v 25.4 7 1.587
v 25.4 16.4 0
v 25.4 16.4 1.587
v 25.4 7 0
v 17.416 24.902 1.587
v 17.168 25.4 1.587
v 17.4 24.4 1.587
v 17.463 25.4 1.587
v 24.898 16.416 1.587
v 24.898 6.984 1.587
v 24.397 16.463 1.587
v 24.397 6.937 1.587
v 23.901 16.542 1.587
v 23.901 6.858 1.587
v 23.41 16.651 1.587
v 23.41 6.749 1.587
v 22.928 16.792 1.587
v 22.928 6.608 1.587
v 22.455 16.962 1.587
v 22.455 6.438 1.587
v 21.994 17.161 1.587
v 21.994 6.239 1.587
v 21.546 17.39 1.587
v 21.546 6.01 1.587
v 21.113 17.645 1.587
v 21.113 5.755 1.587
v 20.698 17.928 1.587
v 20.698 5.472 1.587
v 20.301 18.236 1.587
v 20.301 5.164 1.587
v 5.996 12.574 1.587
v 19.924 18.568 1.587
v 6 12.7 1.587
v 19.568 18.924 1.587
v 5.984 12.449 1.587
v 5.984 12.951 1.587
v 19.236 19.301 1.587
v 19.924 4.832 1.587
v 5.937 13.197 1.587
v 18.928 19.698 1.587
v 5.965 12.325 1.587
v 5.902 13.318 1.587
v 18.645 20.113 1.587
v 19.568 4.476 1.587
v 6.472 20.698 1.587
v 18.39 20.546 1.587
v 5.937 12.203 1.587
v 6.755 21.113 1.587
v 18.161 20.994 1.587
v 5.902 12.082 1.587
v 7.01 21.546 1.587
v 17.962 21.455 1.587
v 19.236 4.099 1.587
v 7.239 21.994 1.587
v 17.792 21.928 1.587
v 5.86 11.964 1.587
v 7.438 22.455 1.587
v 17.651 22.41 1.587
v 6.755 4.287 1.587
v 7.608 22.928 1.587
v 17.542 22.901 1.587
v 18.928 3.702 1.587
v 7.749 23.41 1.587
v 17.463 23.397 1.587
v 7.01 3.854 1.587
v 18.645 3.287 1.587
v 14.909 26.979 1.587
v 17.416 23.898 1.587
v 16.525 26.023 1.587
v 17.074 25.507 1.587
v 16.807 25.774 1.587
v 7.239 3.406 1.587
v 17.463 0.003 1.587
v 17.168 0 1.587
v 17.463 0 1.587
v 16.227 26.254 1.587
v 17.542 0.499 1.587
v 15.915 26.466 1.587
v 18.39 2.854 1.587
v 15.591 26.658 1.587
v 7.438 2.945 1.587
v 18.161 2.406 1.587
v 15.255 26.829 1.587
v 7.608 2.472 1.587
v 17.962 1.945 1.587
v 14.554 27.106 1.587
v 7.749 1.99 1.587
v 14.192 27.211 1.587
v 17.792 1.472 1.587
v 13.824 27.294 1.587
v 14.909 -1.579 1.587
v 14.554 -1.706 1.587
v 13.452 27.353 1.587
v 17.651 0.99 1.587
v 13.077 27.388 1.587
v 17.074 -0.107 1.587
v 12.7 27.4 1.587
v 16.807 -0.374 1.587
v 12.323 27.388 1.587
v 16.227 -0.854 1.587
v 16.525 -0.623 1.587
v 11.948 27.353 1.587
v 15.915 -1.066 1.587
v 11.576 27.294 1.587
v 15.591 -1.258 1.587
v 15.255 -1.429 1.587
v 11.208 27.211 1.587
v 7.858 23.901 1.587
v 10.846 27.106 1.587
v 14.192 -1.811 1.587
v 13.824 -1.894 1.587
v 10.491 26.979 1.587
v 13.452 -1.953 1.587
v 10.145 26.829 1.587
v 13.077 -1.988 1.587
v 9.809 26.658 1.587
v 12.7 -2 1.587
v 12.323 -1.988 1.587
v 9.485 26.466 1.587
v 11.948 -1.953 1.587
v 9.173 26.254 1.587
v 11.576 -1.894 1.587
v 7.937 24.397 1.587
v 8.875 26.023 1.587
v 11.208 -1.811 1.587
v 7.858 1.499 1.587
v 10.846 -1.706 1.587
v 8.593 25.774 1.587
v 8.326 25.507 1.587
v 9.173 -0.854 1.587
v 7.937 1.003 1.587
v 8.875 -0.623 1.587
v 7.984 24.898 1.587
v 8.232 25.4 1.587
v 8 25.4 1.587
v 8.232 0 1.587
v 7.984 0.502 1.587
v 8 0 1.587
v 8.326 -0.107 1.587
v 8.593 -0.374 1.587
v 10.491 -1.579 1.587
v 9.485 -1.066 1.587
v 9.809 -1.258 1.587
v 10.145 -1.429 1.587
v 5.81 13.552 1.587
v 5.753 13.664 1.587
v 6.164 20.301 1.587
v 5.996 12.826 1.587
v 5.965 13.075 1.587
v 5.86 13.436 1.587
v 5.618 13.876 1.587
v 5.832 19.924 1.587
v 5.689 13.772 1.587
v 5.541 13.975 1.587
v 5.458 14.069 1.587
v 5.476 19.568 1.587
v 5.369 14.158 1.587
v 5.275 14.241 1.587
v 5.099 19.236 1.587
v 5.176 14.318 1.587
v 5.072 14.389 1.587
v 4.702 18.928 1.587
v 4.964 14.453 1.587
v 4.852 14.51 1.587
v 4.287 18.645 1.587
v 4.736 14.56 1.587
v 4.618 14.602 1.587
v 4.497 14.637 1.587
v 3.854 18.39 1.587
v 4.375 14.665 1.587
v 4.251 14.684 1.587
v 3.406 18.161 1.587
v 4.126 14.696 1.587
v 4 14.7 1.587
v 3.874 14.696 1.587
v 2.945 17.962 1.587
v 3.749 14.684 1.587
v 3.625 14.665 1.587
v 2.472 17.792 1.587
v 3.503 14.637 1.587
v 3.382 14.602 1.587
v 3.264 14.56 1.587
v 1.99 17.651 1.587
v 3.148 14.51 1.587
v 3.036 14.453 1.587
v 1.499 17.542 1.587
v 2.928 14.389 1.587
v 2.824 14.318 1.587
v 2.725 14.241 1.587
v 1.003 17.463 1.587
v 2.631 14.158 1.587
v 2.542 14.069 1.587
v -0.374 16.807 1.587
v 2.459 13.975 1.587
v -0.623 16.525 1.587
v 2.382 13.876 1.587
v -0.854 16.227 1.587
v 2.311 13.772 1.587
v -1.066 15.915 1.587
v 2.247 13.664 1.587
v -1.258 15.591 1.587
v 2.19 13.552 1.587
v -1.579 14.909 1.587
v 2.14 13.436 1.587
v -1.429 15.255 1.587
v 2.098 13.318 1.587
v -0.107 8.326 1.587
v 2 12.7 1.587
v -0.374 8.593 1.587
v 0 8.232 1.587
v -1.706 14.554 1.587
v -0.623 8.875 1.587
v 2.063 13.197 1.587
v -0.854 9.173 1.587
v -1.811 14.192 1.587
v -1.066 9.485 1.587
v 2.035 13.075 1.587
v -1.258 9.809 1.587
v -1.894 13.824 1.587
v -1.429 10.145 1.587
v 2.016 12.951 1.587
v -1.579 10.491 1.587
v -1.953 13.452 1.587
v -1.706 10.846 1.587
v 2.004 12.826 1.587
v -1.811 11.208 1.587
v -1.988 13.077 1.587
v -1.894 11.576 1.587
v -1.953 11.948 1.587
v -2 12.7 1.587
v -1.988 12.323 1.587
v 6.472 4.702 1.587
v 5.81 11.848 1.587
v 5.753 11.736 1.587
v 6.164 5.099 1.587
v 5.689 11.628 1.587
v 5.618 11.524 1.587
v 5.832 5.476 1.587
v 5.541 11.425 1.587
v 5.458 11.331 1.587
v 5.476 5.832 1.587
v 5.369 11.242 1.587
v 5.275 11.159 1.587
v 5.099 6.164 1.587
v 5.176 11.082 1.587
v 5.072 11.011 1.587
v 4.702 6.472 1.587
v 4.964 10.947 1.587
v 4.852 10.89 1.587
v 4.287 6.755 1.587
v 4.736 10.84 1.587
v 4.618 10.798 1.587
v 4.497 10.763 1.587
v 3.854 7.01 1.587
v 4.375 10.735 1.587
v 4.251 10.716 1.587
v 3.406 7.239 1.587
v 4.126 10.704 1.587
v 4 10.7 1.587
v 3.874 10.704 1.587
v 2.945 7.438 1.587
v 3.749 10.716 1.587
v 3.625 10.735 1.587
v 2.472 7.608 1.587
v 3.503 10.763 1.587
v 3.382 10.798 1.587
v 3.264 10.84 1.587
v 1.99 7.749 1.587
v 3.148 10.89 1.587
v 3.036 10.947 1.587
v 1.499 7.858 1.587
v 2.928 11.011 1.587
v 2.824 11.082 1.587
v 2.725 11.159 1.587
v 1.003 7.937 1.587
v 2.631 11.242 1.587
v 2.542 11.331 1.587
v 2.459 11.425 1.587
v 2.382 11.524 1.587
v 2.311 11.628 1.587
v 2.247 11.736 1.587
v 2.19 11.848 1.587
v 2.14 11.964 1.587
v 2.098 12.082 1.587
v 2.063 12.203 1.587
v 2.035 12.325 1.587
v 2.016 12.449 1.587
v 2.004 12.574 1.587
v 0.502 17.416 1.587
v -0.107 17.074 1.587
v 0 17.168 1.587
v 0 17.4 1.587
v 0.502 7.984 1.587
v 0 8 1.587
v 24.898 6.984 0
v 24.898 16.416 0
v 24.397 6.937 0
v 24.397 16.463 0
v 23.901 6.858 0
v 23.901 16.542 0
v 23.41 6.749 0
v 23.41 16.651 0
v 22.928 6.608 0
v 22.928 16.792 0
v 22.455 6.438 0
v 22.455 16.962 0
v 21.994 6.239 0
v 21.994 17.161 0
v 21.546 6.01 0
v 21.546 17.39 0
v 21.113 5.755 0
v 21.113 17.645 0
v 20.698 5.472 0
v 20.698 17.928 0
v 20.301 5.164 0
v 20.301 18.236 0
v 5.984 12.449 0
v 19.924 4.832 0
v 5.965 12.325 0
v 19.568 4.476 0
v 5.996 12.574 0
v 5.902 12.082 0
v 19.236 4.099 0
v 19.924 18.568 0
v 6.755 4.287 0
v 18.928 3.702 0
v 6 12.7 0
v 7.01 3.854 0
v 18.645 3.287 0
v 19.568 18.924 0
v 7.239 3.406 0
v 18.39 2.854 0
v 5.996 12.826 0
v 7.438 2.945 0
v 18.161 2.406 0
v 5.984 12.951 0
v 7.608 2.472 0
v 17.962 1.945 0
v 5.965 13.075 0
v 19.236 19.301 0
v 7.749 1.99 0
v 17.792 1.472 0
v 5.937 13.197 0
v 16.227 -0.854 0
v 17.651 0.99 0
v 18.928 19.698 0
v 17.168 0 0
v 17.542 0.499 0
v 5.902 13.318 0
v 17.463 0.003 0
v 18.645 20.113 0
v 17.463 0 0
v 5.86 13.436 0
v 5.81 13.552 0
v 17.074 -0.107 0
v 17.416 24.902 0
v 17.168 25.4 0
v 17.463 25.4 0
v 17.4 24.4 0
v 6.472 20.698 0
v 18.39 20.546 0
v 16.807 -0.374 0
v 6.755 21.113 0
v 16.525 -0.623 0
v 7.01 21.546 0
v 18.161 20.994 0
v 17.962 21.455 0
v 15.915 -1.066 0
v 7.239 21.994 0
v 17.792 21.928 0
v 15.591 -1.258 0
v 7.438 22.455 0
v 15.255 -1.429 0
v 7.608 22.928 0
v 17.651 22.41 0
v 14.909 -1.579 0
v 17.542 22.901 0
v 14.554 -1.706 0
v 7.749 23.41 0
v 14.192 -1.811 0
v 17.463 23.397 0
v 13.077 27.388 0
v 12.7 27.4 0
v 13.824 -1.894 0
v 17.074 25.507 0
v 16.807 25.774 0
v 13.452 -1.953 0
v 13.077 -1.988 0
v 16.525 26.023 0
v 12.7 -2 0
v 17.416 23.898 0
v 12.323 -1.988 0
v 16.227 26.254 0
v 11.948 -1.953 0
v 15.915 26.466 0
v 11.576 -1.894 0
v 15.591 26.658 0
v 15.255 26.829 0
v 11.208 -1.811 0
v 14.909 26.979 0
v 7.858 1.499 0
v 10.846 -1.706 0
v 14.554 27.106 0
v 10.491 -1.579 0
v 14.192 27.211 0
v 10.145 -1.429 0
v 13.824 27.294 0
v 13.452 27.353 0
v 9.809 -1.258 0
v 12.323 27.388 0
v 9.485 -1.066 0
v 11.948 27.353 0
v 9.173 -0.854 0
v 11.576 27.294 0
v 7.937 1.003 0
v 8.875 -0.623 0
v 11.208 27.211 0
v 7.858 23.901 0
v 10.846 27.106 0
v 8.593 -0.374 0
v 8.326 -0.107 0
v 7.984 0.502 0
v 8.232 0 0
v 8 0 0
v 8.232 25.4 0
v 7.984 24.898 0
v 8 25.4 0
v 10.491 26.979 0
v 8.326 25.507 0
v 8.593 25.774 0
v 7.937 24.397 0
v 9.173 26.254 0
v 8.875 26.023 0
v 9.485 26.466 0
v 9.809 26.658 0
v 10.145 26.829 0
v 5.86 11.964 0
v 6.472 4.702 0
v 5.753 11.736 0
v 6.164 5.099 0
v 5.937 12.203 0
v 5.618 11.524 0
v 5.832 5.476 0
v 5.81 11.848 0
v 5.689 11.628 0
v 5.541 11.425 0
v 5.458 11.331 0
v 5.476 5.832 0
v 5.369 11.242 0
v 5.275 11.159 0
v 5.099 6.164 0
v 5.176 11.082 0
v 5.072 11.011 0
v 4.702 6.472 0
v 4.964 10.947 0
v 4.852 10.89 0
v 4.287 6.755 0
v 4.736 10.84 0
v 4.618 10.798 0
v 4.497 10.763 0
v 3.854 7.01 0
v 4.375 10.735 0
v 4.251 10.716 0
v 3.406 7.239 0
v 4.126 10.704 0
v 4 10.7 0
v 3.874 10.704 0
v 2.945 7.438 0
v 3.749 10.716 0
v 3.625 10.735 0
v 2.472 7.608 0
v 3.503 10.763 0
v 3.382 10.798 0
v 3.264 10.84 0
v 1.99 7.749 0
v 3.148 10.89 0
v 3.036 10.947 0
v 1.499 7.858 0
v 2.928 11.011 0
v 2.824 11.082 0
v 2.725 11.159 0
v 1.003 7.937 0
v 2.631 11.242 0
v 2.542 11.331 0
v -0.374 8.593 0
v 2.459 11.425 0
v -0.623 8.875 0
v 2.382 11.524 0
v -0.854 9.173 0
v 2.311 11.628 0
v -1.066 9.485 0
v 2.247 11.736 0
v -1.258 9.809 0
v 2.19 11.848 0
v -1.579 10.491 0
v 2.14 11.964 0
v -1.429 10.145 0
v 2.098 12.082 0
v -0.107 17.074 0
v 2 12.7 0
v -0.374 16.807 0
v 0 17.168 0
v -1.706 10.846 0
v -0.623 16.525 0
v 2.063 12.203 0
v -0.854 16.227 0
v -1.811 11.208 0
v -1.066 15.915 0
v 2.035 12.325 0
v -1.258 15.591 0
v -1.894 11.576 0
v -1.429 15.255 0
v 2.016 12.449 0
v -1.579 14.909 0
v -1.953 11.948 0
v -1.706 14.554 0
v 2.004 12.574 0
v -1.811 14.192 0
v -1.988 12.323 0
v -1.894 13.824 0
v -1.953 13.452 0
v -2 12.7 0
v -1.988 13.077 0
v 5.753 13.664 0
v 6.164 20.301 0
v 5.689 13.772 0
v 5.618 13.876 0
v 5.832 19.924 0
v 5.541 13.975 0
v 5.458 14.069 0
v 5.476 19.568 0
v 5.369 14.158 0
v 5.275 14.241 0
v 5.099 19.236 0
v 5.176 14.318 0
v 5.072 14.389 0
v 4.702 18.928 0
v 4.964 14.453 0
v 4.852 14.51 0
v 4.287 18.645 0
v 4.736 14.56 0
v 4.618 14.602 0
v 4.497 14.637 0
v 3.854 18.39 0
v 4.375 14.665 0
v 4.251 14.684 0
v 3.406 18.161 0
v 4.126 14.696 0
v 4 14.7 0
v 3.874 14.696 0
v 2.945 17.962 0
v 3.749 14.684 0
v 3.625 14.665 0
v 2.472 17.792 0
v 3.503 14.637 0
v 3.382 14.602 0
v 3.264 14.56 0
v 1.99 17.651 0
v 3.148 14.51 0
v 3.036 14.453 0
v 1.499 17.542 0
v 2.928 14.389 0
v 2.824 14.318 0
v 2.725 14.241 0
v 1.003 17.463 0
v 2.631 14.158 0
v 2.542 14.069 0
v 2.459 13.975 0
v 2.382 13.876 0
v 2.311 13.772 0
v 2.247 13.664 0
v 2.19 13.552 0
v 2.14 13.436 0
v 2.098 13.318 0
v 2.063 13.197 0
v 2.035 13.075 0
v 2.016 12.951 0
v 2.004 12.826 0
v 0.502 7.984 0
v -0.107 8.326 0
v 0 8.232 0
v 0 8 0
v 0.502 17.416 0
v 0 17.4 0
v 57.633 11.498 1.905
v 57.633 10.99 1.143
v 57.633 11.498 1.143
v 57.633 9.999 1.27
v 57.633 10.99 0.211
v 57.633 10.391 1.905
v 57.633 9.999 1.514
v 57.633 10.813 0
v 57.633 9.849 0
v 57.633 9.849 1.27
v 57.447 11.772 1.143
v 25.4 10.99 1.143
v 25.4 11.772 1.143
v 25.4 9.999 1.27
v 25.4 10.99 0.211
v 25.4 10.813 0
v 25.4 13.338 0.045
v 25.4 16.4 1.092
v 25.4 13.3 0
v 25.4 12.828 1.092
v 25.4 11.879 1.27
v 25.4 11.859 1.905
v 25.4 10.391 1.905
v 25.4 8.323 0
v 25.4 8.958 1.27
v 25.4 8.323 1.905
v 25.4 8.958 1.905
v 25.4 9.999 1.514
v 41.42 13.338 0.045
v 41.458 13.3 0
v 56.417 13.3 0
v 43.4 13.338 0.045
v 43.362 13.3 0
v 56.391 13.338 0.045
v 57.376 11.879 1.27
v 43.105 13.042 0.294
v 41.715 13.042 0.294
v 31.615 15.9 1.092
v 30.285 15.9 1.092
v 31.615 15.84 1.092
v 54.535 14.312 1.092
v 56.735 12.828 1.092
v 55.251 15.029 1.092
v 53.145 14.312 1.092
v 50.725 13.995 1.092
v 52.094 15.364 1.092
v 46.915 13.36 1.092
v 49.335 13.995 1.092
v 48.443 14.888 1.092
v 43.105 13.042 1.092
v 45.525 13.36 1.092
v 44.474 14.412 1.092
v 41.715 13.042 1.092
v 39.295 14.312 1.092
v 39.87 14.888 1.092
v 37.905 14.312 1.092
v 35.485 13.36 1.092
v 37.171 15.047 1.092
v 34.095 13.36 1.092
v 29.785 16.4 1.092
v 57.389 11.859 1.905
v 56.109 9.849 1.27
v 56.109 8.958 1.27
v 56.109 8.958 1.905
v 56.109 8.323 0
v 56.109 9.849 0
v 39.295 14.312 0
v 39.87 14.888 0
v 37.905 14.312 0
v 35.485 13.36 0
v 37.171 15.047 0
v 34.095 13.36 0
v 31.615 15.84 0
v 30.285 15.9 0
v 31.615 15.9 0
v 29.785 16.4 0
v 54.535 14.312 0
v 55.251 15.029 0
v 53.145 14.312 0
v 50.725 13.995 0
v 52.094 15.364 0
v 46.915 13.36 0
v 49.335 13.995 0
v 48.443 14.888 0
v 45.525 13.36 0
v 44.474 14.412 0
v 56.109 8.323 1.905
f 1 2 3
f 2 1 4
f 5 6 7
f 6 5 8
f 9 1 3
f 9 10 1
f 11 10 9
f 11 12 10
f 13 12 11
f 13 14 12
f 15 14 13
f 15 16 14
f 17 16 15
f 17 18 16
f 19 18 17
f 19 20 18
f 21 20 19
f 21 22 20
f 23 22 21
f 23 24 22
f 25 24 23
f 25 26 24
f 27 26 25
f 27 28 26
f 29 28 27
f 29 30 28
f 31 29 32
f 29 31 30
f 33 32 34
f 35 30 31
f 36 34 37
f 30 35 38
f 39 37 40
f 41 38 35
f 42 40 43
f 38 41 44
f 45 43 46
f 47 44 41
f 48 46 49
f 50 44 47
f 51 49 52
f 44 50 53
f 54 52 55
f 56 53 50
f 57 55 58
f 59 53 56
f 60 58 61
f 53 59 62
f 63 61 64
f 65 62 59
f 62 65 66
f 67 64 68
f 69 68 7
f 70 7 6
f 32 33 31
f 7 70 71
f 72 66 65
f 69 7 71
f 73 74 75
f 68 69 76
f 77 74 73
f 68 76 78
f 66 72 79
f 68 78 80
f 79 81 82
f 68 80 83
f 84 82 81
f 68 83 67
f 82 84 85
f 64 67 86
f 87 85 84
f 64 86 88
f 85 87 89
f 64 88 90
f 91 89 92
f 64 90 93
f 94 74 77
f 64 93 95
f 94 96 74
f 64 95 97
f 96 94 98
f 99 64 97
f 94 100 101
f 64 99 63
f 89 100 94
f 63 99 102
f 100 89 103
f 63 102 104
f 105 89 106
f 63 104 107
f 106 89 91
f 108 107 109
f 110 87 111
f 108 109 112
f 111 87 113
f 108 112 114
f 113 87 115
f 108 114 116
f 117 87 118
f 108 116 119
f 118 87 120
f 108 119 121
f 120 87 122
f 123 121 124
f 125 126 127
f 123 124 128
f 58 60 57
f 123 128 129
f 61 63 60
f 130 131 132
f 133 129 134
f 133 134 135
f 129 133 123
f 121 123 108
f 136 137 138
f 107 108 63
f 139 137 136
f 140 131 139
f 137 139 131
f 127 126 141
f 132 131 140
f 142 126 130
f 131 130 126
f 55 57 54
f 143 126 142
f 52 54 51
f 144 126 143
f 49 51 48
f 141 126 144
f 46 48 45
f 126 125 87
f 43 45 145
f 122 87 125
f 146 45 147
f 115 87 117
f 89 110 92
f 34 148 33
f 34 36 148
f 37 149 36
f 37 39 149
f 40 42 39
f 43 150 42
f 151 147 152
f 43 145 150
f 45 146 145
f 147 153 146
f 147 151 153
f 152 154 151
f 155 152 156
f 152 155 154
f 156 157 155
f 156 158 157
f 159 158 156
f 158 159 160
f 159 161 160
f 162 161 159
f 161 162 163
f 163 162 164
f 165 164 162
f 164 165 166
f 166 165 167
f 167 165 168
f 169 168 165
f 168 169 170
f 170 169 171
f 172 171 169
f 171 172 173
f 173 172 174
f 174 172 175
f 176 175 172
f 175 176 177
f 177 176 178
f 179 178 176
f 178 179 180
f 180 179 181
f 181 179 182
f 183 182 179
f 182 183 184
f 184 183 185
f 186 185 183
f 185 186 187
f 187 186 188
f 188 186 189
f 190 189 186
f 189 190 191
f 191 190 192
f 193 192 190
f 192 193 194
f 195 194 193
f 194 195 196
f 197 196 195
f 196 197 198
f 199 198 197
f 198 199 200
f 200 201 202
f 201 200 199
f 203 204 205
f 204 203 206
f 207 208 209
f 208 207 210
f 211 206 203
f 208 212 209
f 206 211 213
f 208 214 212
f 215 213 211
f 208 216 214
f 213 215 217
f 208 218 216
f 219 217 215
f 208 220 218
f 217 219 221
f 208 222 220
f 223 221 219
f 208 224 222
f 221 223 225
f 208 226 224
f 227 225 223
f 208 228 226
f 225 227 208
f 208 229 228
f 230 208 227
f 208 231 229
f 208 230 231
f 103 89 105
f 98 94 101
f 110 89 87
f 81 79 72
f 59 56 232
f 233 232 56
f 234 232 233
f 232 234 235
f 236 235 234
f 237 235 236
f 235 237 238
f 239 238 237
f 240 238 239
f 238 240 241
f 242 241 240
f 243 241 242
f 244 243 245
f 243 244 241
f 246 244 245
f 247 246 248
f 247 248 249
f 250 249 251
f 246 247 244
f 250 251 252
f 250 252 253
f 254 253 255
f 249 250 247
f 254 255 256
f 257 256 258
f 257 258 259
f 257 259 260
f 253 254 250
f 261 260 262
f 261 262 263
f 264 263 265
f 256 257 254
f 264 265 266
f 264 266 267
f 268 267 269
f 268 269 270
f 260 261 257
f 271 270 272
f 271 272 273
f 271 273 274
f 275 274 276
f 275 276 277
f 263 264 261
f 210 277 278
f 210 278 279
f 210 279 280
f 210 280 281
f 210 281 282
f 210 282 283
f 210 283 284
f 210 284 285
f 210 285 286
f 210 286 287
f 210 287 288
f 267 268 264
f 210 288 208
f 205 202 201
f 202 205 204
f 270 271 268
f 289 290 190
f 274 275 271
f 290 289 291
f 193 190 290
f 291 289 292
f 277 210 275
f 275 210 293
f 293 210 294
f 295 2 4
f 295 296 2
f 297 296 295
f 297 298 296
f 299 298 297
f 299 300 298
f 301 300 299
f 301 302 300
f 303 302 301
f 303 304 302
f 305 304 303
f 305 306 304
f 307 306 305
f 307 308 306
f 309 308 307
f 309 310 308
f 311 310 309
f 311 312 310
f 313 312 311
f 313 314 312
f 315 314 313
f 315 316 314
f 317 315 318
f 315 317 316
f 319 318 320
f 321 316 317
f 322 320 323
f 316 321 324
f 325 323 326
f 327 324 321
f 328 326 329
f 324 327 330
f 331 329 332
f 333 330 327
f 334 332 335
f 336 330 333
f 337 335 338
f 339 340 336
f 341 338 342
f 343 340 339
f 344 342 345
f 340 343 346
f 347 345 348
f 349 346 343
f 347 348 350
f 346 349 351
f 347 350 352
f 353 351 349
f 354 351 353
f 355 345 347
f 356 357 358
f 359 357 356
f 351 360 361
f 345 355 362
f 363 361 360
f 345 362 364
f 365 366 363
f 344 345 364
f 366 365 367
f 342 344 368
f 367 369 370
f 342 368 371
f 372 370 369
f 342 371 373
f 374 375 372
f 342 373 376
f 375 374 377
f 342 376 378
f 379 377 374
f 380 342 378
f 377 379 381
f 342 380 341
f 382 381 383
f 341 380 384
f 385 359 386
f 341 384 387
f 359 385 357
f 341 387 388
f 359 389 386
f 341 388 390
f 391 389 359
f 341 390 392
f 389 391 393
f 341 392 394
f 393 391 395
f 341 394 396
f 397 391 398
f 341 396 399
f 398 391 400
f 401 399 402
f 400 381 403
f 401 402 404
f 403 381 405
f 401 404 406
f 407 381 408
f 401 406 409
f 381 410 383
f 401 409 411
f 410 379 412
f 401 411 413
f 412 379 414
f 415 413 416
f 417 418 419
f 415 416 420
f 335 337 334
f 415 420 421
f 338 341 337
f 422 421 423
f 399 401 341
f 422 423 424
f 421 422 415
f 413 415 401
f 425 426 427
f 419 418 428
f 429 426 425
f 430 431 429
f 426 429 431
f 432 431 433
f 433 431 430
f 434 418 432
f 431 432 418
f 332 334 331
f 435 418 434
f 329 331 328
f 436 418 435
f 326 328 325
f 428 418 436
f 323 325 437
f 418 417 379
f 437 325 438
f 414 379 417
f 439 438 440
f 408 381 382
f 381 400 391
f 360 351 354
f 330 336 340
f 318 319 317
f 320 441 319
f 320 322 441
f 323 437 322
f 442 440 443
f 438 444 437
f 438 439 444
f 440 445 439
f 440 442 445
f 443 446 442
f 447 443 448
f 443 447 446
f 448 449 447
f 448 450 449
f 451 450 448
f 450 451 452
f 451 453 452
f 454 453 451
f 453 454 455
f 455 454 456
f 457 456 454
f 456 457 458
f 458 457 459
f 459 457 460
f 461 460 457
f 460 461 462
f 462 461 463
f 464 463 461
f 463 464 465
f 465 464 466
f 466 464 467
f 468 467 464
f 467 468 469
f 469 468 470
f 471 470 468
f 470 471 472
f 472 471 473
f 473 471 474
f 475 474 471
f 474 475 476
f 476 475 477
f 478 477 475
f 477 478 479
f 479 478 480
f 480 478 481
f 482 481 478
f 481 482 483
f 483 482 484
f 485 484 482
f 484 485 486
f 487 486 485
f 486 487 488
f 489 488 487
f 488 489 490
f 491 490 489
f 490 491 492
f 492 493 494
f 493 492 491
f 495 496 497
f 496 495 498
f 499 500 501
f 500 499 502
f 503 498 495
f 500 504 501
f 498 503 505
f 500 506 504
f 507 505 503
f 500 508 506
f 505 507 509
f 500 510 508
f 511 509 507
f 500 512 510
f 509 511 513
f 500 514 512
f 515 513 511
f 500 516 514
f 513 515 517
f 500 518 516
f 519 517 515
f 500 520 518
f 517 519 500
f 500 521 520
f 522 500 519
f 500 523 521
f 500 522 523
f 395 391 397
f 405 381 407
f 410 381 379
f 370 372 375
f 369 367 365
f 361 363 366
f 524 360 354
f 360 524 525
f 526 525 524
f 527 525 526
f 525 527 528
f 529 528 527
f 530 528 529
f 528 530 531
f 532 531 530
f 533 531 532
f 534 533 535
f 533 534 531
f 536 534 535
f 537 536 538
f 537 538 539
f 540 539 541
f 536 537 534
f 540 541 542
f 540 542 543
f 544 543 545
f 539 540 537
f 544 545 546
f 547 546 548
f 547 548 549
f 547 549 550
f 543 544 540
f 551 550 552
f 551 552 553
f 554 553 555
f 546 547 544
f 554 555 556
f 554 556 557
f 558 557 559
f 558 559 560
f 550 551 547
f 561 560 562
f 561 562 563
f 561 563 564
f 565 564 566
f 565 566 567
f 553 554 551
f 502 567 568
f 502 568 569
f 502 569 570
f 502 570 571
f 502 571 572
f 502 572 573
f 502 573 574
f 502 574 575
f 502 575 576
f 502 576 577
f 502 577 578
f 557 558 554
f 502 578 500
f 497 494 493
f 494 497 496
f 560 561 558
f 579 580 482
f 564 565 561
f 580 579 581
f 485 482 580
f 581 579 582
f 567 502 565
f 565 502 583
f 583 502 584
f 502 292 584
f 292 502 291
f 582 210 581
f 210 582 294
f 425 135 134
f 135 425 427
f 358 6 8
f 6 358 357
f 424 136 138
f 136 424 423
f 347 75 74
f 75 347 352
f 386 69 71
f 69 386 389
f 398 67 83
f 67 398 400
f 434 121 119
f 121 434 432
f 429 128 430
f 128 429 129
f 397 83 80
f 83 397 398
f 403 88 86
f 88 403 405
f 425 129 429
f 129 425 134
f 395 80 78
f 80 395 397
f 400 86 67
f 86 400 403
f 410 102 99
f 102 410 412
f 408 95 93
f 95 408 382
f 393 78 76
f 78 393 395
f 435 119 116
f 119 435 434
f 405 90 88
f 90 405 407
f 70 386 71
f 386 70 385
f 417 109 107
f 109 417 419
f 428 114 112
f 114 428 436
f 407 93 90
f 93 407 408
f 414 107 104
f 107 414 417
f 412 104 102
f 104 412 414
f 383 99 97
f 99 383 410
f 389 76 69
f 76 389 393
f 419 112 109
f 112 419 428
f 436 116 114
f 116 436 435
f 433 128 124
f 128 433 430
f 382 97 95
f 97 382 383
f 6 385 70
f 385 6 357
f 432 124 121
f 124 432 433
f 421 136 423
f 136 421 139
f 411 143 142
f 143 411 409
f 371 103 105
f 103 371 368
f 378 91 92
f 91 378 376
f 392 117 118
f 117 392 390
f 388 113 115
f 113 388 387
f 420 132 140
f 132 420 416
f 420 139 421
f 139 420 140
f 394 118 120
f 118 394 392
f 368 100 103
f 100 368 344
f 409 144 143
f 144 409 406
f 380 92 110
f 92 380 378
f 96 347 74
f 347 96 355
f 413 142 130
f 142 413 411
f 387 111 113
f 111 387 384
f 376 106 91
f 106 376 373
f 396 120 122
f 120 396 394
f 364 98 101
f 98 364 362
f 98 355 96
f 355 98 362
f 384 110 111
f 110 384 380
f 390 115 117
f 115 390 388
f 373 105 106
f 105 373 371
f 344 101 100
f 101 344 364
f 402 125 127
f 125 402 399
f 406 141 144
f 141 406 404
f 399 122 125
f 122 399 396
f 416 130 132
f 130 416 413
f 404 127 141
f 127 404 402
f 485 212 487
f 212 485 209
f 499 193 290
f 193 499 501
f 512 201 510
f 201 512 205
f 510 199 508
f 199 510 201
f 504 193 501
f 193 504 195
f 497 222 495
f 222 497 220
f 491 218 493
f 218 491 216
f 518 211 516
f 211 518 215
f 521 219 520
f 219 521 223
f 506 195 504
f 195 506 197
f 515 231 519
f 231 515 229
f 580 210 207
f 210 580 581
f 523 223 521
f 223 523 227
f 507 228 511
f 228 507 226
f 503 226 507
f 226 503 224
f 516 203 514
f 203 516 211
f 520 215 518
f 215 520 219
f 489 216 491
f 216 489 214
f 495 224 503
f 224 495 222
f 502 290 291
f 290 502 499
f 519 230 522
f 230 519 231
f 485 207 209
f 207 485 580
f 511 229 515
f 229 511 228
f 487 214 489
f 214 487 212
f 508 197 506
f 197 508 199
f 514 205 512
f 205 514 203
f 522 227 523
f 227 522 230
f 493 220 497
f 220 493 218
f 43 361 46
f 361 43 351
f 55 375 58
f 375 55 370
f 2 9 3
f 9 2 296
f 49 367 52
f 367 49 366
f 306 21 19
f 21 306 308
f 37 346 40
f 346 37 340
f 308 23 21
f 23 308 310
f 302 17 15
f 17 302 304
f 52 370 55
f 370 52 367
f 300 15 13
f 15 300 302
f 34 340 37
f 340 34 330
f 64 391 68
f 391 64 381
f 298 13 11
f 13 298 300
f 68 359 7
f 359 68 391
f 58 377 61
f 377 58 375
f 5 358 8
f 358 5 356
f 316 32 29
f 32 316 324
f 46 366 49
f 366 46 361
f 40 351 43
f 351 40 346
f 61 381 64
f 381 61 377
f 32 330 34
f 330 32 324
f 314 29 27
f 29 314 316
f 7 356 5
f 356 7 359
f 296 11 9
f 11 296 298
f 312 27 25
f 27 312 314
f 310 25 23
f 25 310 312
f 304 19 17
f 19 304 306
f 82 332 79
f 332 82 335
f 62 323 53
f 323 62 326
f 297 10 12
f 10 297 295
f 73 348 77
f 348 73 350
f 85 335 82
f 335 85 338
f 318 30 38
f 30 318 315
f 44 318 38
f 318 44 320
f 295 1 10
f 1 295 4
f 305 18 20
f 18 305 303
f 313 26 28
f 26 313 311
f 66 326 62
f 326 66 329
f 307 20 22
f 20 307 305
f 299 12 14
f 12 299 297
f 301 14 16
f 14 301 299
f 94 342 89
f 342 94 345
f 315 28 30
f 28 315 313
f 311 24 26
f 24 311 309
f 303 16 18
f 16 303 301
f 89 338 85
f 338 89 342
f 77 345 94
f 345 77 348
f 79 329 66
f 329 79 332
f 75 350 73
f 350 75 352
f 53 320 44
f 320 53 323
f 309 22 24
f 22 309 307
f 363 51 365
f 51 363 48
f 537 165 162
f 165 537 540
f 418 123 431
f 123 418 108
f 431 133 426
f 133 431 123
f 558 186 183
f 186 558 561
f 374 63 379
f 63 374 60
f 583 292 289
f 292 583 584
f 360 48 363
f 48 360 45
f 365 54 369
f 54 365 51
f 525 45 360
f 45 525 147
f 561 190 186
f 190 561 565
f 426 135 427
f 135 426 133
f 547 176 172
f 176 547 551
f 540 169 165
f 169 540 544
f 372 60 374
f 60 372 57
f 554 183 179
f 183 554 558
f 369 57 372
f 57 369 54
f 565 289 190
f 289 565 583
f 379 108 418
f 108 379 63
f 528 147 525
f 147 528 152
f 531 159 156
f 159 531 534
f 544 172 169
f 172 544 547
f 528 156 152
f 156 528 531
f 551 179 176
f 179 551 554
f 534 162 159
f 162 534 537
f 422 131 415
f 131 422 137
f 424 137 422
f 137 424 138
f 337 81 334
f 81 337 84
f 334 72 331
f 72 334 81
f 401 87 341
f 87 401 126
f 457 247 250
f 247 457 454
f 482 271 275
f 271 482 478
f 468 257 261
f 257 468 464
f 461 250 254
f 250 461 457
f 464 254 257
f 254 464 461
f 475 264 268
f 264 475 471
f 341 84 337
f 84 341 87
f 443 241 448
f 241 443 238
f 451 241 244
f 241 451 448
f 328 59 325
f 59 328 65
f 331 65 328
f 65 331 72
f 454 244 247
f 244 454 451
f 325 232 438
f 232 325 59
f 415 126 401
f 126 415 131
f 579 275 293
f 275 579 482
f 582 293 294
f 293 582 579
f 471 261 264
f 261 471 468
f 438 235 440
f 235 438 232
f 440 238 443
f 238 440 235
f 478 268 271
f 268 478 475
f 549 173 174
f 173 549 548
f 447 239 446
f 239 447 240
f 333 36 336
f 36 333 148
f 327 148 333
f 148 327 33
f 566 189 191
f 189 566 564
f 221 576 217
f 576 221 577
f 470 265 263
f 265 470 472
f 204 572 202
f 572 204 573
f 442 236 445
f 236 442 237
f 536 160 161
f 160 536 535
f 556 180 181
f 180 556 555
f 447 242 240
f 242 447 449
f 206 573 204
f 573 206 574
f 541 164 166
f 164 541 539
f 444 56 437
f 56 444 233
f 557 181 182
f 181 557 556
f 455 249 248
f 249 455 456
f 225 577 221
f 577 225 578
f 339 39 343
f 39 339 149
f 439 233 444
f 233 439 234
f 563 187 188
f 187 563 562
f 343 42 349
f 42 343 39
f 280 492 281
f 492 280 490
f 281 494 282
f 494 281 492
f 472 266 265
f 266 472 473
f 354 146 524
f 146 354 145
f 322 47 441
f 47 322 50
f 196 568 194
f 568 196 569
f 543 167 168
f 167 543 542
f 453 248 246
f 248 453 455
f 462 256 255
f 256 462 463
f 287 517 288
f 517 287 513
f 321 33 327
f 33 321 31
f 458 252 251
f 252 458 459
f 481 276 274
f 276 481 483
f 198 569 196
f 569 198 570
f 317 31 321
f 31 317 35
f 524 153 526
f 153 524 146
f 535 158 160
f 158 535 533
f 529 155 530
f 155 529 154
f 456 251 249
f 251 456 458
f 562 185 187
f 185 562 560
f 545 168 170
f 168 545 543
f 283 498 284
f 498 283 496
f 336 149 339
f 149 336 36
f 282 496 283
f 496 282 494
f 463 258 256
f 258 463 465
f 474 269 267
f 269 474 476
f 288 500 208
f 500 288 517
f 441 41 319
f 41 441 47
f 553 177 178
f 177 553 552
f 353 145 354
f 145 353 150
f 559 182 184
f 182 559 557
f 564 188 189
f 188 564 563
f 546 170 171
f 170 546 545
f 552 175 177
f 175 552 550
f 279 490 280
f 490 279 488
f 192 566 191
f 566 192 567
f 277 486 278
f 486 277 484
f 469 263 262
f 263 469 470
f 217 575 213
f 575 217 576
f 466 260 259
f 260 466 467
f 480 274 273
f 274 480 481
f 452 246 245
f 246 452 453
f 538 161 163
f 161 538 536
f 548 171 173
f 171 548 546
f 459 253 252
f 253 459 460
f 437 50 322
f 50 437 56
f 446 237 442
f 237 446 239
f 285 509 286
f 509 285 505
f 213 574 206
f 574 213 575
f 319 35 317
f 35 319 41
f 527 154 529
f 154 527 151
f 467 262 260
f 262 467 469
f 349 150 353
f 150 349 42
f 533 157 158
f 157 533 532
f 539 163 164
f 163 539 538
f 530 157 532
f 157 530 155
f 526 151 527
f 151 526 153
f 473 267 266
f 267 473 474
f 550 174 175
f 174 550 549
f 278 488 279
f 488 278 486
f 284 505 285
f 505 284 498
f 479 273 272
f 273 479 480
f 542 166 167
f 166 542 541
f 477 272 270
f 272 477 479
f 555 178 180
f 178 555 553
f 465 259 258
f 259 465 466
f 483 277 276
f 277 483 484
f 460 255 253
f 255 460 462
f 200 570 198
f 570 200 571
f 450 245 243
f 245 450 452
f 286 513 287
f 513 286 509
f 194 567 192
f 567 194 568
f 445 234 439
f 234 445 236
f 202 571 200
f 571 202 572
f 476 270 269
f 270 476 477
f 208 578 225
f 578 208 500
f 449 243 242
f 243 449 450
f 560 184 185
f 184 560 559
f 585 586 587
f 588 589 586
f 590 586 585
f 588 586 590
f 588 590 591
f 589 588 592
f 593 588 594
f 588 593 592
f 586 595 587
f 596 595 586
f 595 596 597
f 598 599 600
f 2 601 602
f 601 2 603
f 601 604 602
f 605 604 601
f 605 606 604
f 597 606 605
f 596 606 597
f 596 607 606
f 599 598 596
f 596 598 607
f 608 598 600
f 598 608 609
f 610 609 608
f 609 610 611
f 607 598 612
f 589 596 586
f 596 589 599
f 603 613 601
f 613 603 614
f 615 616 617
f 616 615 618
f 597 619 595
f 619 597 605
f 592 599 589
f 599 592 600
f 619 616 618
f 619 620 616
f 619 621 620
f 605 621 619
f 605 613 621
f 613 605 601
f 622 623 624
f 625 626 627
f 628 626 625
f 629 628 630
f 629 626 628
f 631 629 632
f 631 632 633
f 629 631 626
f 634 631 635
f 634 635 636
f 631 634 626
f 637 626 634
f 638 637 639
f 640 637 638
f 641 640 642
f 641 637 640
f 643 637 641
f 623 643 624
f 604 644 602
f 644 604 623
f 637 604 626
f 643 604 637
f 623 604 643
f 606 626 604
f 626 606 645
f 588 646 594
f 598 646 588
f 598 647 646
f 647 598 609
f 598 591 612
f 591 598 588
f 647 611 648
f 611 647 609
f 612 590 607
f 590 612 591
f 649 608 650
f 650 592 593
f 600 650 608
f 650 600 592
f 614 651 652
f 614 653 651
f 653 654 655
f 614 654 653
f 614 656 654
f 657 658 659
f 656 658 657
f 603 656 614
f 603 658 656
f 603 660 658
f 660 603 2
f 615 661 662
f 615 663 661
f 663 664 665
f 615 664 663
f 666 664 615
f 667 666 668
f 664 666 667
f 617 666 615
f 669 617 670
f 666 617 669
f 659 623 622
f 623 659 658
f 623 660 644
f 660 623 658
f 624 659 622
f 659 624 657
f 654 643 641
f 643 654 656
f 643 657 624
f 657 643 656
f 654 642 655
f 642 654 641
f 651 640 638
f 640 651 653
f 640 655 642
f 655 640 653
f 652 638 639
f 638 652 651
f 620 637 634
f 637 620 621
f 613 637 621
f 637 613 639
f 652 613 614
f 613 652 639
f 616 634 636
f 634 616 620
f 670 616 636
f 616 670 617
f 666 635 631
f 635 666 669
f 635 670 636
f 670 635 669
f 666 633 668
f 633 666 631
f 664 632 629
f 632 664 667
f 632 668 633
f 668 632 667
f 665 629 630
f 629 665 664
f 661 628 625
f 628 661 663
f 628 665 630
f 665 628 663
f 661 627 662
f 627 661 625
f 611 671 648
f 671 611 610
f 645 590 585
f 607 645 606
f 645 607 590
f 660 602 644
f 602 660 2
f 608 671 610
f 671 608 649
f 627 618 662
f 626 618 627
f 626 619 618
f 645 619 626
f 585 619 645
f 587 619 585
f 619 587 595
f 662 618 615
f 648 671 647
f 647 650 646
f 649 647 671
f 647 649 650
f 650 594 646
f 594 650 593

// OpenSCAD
//BEST G - Model

$fn=100;

function mm(i) = i*25.4;

module bow(bow_length, bow_width, bow_thickness)
{
	difference()
	{
		union()
		{
			cube([bow_length, bow_width, bow_thickness]);

			//Place cylinders on the top and bottom of the bow for style

			//Top middle
			translate([bow_length / 2, bow_width - 4, 0]) cylinder(h = bow_thickness, r = 6);

			//Bottom middle
			translate([bow_length / 2, 4, 0]) cylinder(h = bow_thickness, r = 6);

			//Left
			translate([4, bow_width / 2, 0]) cylinder(h = bow_thickness, r = 6);
		}

		//Place cylinders around the edges to create a more contoured design

		//Right top
		translate([bow_length, bow_width - 1, 0]) cylinder(h = bow_thickness, r = 8);

		//Right bottom
		//Positioned -1 from the axis to create a bow stop
		translate([bow_length, -1 , 0]) cylinder(h = bow_thickness, r = 8);
		
		//Left top
		translate([0, bow_width, 0]) cylinder(h = bow_thickness, r = 8);
	
		//Left bottom
		translate([0, 0, 0]) cylinder(h = bow_thickness, r = 8);

		//Place hole for keychain use
		translate([4, bow_width / 2, 0]) cylinder(h = bow_thickness, r = 2);
	}
}

module bit()
{
	w = mm(1/4);
	difference() 
	{
		translate([-w/2, 0, 0]) cube([w, mm(1), w]);
		translate([-mm(7/256), 0, 0]) rotate([0, 0, 135]) cube([w, w, w]);
		translate([mm(7/256), 0, 0]) rotate([0, 0, -45]) cube([w, w, w]);
}
}

module blade(blade_length, blade_width, blade_thickness, key_cuts, shoulder, cut_spacing, cut_depth)
{
	difference()
	{
		cube([blade_length, blade_width, blade_thickness]);

		//Contour tip		 
		translate([blade_length, mm(1/8), 0]) {
			rotate([0, 0, 34]) cube([10, 10, blade_thickness]);
		}

		//Tip stop
		translate([blade_length - mm(.06), 0, 0]) {
			cube([mm(.09877), mm(.0601), blade_thickness]);
		}
		
		//Cut the key channels
		union() 
		{	
			translate([0, mm(.105), 0]) cube([blade_length, mm(5/128), mm(.045)]);
			translate([0, mm(.14), mm(.05)]) rotate([230, 0, 0]) cube([blade_length, mm(8/64), blade_thickness]);
		}
        
		translate([0, blade_width - mm(9/64), mm(.043)]) 
		{
			cube([blade_length, mm(10/64), blade_thickness]);
			rotate([50, 0, 0]) cube([blade_length, blade_width, blade_thickness]);
		}
        
		union() {
			translate([0, mm(0.025), mm(.05)]) cube([blade_length, mm(.041), blade_thickness]);
			translate([0, mm(0.015) + mm(13/256), blade_thickness - mm(1/64)]) rotate([45, 0, 0]) cube([blade_length, mm(1/16), mm(1/16)]);
		}

		//Cut the blade
		for (counter = [0:6]) 
		{
			translate([shoulder + (counter * cut_spacing) + .5, blade_width - (key_cuts[counter]) * cut_depth - .5, 0]) bit();
		}
	}
}

module best_g(key_cuts) 
{
	blade_length = mm(1.269);
	blade_width = mm(.318);
	blade_thickness = mm(0.075);

	shoulder = mm(0.2);
	cut_spacing = mm(.15);
	cut_depth = mm(.0125);
    
	bow_length = mm(1);
	bow_width = mm(1);
	bow_thickness = mm(1/16);

	union()
	{
		bow(bow_length, bow_width, bow_thickness); 
		translate([bow_length, bow_width - blade_width - 9, 0]) blade(blade_length, blade_width, blade_thickness, key_cuts, shoulder, cut_spacing, cut_depth);
	}
}

best_g([0, 8, 5, 9, 8, 6, 5]);
